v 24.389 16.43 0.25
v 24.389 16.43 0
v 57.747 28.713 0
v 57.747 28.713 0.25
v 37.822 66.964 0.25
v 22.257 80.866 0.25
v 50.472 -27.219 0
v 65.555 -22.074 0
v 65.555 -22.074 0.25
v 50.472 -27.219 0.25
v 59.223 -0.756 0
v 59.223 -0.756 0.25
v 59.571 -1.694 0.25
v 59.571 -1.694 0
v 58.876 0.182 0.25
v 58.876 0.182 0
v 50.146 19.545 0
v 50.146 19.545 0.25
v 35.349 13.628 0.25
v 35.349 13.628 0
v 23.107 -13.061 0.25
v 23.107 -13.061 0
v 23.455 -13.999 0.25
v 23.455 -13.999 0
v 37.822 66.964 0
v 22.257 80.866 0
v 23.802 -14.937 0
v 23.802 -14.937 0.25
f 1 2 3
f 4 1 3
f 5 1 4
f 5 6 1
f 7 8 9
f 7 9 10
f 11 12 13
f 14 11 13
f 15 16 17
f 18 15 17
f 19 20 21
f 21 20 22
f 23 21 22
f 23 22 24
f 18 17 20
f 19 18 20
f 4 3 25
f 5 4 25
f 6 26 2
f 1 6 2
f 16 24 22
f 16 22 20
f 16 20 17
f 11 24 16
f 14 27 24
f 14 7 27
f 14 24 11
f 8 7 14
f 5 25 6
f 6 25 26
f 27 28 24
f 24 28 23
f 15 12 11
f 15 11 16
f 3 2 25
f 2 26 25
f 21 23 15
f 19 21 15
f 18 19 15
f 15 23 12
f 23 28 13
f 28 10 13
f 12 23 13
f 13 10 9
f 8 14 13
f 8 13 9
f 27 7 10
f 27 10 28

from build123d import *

# Parameters (mm, degrees)
BOSS_EXTRUDE1_DEPTH = 0.25
BOSS_EXTRUDE2_DEPTH = 0.25
BOSS_EXTRUDE3_DEPTH = 0.25


with BuildPart() as part:
    # Sketch3 → Boss-Extrude1 (new body)
    with BuildSketch(Plane.XY):
        Polygon((24.389305686, 16.429878113), (57.746622867, 28.713125646), (37.822366733, 66.963931479), (22.25679364, 80.865529077), align=None)
    extrude(amount=BOSS_EXTRUDE1_DEPTH)


with BuildPart() as body_2:
    # Sketch6 → Boss-Extrude2 (new body)
    with BuildSketch(Plane.XY):
        Polygon((23.107487467, -13.060957638), (58.876213079, 0.181757913), (50.146145837, 19.544800291), (35.348767399, 13.627878274), align=None)
    extrude(amount=BOSS_EXTRUDE2_DEPTH)

    # Sketch7 → Boss-Extrude3 (add)
    with BuildSketch(Plane.XY.offset(0.25)):
        Polygon((23.107487467, -13.060957638), (23.454687451, -13.998748751), (59.223413063, -0.7560332), (58.876213079, 0.181757913), align=None)
    extrude(amount=-BOSS_EXTRUDE3_DEPTH)

    # Mirror1: body 2 across plane


with BuildPart() as body_2_1:
    add(body_2.part)
    add(body_2.part.mirror(Plane(origin=(23.454687451, -13.998748751, -38.800088285), x_dir=(0, 0, 1), z_dir=(0.34719998380497613, -0.9377911127995532, 0))))


solid = Compound([part.part, body_2_1.part])
